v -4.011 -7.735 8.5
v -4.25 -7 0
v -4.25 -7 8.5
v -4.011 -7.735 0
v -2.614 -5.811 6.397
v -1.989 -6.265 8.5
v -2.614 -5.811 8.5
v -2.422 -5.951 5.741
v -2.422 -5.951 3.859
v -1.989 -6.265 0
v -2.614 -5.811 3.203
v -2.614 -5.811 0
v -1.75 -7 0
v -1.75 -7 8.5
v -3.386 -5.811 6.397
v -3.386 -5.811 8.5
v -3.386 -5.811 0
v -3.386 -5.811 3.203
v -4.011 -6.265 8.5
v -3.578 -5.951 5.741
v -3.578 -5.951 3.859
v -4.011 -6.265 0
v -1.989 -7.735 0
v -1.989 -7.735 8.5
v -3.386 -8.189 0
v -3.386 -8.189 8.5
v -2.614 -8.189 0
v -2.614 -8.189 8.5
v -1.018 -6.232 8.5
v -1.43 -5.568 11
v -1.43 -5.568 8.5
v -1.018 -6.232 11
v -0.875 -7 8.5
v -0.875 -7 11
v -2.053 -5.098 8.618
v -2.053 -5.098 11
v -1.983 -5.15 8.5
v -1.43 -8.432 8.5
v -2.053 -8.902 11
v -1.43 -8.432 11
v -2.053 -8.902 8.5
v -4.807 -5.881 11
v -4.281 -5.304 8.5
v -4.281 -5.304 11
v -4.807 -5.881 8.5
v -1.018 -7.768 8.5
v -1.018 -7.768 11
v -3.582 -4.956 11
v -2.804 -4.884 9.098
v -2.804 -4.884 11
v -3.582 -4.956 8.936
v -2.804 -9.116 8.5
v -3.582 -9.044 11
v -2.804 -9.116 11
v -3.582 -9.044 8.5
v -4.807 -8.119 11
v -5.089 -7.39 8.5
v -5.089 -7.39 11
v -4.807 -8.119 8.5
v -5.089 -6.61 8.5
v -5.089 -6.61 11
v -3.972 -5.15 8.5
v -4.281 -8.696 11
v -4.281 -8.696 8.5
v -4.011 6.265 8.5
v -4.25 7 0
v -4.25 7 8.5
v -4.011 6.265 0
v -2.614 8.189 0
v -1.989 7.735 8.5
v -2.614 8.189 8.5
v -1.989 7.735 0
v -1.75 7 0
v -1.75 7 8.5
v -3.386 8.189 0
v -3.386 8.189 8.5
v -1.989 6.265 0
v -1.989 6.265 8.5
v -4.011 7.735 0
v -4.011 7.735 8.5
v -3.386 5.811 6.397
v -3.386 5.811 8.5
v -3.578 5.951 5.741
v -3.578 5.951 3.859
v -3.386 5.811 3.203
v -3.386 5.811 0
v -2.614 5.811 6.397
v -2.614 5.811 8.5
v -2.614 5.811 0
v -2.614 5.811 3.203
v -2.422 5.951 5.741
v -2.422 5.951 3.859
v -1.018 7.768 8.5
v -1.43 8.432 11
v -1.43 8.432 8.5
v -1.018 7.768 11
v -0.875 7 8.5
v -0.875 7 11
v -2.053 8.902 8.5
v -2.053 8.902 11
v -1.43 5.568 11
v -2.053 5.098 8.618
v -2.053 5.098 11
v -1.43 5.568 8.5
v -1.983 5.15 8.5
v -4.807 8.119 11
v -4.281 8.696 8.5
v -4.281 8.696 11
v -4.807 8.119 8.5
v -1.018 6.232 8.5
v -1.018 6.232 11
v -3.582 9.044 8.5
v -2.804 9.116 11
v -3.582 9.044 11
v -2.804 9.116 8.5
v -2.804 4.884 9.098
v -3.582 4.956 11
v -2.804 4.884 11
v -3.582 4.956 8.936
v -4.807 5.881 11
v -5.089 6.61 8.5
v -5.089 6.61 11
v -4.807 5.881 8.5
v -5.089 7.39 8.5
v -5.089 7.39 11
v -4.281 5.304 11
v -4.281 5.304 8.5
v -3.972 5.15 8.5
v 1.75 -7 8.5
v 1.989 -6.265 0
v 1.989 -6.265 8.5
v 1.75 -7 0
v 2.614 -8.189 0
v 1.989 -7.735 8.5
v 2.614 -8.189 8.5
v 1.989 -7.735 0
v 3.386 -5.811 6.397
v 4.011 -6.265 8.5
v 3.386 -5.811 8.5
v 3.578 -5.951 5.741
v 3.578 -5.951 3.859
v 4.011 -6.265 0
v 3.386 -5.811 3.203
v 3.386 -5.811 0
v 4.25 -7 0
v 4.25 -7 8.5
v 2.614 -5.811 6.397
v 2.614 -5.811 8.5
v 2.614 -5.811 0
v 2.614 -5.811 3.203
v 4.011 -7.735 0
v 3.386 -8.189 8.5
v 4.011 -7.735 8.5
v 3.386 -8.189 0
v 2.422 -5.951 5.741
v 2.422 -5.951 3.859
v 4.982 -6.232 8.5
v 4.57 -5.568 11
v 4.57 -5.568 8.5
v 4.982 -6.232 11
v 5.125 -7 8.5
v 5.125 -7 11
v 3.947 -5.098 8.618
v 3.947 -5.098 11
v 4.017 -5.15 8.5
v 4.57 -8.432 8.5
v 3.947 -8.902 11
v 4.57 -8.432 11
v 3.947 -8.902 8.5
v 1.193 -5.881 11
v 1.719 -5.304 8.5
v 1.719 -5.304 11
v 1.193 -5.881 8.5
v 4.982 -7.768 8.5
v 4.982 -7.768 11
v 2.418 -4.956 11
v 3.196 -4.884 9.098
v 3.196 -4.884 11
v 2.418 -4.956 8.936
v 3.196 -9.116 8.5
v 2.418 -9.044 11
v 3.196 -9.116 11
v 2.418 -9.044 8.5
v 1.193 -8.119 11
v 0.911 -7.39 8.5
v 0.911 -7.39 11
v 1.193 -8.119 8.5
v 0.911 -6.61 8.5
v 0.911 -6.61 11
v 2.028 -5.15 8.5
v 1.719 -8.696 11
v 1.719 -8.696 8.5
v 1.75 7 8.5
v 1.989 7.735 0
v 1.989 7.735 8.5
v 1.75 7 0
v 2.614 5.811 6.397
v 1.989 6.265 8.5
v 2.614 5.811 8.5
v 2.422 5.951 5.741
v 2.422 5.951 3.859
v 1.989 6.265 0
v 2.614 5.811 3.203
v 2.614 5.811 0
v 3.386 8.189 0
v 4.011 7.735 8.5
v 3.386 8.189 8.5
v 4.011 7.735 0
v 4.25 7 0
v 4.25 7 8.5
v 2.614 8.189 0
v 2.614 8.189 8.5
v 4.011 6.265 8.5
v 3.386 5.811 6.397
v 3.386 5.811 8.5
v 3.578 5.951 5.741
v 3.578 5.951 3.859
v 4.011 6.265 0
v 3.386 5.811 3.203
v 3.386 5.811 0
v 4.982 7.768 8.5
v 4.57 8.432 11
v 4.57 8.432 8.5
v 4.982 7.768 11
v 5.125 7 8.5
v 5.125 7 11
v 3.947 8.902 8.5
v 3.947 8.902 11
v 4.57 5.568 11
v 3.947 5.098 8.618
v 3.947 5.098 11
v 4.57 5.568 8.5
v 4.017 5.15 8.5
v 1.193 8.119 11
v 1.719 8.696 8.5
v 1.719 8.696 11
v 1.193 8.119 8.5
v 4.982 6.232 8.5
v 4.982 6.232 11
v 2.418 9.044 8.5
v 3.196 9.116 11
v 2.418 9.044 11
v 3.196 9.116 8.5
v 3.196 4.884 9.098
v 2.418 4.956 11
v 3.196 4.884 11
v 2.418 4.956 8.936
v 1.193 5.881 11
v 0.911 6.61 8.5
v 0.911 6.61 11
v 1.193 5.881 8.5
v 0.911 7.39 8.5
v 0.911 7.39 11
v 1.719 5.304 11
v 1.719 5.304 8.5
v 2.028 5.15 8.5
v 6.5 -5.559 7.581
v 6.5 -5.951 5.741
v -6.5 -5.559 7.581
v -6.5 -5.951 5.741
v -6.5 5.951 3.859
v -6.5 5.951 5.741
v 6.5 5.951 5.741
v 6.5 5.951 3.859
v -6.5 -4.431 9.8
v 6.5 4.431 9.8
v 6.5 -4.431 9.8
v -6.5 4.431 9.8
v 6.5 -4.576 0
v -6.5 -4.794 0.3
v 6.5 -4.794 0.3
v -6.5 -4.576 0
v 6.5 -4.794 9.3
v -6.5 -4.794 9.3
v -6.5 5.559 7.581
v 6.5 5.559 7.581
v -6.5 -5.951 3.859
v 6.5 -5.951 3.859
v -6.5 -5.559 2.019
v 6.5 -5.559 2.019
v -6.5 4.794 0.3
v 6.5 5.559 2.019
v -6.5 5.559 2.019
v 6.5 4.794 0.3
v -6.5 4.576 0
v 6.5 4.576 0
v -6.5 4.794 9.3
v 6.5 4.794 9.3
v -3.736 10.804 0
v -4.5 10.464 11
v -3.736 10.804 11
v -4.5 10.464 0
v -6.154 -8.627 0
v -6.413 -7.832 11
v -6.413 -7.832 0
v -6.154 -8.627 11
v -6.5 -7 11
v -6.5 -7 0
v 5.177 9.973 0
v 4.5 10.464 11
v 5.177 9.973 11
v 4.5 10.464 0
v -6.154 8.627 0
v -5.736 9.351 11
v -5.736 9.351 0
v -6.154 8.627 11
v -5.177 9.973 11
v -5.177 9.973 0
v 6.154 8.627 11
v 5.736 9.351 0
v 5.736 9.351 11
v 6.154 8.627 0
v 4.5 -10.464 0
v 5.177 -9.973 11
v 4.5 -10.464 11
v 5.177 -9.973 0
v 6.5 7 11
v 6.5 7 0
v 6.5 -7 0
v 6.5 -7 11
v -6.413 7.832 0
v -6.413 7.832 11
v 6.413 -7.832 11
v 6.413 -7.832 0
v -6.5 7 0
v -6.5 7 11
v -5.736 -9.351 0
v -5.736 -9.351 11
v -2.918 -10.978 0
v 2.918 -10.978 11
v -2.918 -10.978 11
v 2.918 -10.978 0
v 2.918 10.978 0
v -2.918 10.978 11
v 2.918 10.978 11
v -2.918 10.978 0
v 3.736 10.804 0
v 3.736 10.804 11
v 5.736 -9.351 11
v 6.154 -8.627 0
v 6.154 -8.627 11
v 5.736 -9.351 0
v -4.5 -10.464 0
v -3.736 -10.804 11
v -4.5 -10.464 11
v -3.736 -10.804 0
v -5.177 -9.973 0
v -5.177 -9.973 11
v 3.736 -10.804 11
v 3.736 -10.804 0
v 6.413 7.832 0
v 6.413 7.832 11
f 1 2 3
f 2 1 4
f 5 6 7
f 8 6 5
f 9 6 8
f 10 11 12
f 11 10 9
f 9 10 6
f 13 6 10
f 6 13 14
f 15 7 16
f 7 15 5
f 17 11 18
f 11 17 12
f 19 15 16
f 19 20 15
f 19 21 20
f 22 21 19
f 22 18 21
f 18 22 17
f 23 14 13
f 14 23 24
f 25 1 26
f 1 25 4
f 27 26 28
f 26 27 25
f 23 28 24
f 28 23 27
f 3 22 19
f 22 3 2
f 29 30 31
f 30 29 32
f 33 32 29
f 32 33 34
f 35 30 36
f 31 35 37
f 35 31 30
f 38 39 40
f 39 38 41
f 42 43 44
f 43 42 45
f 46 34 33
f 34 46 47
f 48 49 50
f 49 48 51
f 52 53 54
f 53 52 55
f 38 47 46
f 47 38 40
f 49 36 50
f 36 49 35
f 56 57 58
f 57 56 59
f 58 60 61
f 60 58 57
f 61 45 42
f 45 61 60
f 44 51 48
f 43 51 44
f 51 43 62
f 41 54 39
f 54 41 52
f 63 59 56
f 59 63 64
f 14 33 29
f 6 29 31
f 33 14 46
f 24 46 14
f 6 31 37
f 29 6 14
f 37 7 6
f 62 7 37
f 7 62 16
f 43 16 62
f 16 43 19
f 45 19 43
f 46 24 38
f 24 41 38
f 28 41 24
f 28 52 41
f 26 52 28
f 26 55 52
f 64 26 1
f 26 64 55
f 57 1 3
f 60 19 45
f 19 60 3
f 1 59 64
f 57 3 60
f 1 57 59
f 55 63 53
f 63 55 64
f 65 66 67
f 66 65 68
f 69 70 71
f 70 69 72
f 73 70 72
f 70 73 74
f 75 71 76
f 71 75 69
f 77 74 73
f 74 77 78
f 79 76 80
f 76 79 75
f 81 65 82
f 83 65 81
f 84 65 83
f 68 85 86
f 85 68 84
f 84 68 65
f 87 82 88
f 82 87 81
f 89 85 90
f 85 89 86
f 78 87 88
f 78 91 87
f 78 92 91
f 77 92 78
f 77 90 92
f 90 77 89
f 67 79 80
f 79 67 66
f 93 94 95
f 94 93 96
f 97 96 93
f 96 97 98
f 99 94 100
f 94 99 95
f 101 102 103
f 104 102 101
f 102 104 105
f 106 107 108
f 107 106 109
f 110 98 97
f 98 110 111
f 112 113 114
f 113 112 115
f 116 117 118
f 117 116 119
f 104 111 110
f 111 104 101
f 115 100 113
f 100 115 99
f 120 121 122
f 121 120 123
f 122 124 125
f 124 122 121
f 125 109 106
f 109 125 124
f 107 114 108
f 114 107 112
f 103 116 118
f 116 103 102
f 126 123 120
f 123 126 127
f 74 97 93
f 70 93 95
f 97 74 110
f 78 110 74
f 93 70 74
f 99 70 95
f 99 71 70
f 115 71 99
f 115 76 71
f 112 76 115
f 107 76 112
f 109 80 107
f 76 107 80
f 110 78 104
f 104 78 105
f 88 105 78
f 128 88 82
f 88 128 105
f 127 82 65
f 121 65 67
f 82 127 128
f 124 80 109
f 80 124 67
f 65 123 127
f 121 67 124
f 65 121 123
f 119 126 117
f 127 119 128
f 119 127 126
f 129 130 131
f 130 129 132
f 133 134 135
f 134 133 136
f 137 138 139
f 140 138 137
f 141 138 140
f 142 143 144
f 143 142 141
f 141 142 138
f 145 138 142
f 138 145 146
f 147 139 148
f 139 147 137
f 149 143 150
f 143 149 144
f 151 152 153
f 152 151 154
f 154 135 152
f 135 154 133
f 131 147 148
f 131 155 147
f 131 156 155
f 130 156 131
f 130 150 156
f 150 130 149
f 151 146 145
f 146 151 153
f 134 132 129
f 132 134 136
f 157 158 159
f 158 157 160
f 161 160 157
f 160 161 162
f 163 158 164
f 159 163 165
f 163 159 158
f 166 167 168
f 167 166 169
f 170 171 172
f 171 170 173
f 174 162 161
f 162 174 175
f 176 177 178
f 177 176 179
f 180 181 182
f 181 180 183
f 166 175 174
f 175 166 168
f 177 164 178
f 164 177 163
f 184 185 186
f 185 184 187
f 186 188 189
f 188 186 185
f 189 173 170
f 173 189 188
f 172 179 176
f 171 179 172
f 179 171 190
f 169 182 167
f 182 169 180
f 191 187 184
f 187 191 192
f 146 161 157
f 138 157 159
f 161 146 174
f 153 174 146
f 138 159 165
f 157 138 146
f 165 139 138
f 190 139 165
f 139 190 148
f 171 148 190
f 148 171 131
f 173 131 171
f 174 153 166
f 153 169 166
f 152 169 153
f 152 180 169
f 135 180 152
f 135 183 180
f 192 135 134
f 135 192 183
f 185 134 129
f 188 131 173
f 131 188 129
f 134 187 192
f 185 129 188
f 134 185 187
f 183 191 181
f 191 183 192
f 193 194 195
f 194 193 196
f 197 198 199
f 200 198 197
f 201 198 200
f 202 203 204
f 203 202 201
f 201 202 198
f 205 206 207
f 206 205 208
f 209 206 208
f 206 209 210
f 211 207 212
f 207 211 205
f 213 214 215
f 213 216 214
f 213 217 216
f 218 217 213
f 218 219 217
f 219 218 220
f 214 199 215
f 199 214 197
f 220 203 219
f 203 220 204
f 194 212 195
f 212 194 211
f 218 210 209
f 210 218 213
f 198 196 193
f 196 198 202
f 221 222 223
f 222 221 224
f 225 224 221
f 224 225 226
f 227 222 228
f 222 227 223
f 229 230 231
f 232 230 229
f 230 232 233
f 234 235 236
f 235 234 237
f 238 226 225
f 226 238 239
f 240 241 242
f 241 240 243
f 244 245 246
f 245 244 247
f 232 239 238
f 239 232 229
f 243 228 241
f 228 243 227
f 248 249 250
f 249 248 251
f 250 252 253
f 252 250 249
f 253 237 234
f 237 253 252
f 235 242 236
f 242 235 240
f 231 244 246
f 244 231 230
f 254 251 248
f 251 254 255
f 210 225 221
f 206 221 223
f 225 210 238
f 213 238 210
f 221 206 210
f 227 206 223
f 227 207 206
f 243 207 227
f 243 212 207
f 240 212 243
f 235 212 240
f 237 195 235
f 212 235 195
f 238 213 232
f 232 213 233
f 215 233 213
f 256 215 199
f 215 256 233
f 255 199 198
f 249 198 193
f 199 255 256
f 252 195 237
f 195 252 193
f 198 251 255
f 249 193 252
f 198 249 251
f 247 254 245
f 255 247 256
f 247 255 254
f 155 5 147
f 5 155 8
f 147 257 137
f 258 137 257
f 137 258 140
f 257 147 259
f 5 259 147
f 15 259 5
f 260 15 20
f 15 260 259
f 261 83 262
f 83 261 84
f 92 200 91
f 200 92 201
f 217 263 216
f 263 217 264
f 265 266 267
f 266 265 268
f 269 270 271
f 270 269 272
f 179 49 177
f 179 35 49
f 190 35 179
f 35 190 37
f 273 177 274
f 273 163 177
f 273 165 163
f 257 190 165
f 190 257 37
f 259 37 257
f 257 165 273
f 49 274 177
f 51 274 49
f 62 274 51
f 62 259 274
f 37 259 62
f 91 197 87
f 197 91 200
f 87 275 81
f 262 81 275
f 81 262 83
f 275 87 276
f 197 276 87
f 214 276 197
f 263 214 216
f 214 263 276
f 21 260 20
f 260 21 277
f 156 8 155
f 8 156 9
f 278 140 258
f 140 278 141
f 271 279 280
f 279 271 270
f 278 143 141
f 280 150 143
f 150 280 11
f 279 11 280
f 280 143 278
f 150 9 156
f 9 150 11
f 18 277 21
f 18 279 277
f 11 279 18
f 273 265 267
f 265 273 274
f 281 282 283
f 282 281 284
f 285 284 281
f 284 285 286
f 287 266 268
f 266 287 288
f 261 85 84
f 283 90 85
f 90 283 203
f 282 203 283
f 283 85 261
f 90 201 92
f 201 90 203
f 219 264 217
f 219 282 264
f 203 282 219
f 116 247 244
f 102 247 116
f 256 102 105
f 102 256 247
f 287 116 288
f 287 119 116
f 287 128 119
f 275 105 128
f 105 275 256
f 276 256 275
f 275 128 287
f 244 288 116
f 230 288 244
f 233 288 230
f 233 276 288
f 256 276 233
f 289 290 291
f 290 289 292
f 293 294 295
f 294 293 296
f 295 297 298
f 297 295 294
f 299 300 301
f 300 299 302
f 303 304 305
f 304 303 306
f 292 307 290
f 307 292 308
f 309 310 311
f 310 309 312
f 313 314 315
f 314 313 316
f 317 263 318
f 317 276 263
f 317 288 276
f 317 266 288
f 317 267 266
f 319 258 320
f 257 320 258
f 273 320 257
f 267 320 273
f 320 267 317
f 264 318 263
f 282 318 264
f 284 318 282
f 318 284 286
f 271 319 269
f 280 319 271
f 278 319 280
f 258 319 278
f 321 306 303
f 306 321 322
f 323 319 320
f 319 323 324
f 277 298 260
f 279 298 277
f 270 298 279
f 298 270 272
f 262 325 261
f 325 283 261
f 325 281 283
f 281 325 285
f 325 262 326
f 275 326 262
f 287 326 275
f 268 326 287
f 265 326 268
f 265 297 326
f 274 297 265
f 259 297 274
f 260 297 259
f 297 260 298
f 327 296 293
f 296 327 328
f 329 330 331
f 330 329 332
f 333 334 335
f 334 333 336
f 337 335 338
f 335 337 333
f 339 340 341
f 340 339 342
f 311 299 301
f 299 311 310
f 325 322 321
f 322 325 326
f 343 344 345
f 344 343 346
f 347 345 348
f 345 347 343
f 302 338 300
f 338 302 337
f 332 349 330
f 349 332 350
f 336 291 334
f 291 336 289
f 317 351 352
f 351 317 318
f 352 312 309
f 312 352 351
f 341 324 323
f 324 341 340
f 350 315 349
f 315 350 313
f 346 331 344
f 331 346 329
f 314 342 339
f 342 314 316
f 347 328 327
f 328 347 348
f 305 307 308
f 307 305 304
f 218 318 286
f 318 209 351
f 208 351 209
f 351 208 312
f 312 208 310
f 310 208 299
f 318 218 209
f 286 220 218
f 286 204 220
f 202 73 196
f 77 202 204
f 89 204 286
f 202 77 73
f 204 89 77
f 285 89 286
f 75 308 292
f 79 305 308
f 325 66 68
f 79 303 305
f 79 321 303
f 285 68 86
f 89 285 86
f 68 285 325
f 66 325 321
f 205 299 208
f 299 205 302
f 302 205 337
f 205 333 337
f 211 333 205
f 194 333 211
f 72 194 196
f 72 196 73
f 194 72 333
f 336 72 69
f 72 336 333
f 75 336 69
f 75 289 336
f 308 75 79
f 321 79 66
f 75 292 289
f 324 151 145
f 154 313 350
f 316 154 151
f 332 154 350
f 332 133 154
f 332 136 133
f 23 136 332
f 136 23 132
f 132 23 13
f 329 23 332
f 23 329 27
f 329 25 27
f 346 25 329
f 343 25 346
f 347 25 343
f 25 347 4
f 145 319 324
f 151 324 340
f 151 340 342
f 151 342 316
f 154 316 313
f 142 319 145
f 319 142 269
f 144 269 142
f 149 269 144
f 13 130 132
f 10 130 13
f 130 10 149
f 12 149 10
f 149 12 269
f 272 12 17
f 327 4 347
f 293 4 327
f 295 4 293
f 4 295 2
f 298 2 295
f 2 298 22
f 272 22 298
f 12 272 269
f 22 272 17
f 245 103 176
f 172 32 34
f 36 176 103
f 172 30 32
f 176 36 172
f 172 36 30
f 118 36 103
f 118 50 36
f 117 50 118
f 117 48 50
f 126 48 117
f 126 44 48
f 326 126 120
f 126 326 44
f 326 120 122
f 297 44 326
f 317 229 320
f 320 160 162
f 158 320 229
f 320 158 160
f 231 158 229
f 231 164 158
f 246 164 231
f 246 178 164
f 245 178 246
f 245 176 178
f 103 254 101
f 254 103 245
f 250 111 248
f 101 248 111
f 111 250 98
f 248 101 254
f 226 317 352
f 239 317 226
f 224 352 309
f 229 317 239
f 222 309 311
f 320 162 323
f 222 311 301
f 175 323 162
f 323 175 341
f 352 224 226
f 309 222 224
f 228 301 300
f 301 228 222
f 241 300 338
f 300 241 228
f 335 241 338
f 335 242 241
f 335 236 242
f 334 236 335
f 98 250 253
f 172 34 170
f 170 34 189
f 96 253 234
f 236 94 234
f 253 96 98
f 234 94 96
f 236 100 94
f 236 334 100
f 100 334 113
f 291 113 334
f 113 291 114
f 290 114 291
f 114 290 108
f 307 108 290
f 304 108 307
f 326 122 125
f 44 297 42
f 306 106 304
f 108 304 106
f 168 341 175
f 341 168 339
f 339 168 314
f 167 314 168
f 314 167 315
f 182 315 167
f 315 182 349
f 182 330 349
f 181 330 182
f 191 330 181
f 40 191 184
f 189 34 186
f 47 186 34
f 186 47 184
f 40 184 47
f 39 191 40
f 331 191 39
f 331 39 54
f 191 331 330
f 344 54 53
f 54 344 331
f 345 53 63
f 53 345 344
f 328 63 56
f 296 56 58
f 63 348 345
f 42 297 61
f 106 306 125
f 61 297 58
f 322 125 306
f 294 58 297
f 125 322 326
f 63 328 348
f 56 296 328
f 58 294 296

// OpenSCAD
// file: motor_mount_correct.scad
// This document uses MILLIMETRES as a unit.

// Set $fs (smallest arc fragment) to lower value than default 2.0
$fs = 0.8; // millimetres

// Use the correct orientation, we can rotate it in the slicer.
// This is designed to be printed sideways (y axis=up), so that the filament will be
// in the best direction

motor_width = 12;
motor_height = 10;
overall_height = motor_height + 1.0; // Needs to be bigger than the motor!
motor_length = 13;
motor_length_half = motor_length / 2;
motor_width_half = motor_width / 2;
motor_height_half = motor_height / 2;
side_overlap = 4.0;
cutout_r = 2.125;

hole_distance_y = 14;
hole_distance_x = 6;

module outline() {
    intersection() {
        square([motor_height, motor_width], center=true);
        rad1 = motor_width - 3;
        translate([0, - motor_width_half + rad1]) 
            circle(r=rad1);
        translate([0, motor_width_half - rad1]) 
            circle(r=rad1);
    }
}


module mount_holes(cutout_depth)
{
    // These holes should be along the z axis.
    translate([0,0, -1]) {
        for (x = [-0.5 * hole_distance_x, 0.5 * hole_distance_x] ) {
            for (y = [-0.5 * hole_distance_y, 0.5 * hole_distance_y]) {
                translate([x,y,0])
                    cylinder(r=1.25, h=overall_height + 3.0);
                echo("cutout_depth=", cutout_depth);
                if (cutout_depth > 0.01) {
                    translate([x,y,overall_height + 1.0 - cutout_depth])
                        cylinder(r=cutout_r, h = overall_height);
                }
            }
        }     
    }
}

module mount_outside()
{
    r1 = 4.0; // radius of corner
    border = 5.0;
    
    /* This is what we really want ... */
    mx = motor_length_half  - r1;
    my = motor_width_half + border - r1;
    linear_extrude(height=overall_height) {
        hull() {
            translate([mx, my]) circle(r1);
            translate([-mx, my]) circle(r1);
            translate([mx, -my]) circle(r1);
            translate([-mx, -my]) circle(r1);
        }
    }
}


module motor_cutout()
{
    // Cut out for motor
    rotate([0,-90,0])
    translate([motor_height_half - 0.2, 0,0 ]) {
        linear_extrude(height=motor_length + 12.0, center=true) {
            outline();
        }
    }
}

module motor_mount_main(cutout_depth = 0.0) {
    difference()
    {
        mount_outside();
        union()
        {
            motor_cutout();
            mount_holes(cutout_depth);
        }
    }
}

motor_mount_main();
// main file
/*
 * A variation on motor mount with cutouts.
 */
use <motor_mount_correct.scad>;

cutout_d = 2.5;

motor_mount_main(cutout_d);
